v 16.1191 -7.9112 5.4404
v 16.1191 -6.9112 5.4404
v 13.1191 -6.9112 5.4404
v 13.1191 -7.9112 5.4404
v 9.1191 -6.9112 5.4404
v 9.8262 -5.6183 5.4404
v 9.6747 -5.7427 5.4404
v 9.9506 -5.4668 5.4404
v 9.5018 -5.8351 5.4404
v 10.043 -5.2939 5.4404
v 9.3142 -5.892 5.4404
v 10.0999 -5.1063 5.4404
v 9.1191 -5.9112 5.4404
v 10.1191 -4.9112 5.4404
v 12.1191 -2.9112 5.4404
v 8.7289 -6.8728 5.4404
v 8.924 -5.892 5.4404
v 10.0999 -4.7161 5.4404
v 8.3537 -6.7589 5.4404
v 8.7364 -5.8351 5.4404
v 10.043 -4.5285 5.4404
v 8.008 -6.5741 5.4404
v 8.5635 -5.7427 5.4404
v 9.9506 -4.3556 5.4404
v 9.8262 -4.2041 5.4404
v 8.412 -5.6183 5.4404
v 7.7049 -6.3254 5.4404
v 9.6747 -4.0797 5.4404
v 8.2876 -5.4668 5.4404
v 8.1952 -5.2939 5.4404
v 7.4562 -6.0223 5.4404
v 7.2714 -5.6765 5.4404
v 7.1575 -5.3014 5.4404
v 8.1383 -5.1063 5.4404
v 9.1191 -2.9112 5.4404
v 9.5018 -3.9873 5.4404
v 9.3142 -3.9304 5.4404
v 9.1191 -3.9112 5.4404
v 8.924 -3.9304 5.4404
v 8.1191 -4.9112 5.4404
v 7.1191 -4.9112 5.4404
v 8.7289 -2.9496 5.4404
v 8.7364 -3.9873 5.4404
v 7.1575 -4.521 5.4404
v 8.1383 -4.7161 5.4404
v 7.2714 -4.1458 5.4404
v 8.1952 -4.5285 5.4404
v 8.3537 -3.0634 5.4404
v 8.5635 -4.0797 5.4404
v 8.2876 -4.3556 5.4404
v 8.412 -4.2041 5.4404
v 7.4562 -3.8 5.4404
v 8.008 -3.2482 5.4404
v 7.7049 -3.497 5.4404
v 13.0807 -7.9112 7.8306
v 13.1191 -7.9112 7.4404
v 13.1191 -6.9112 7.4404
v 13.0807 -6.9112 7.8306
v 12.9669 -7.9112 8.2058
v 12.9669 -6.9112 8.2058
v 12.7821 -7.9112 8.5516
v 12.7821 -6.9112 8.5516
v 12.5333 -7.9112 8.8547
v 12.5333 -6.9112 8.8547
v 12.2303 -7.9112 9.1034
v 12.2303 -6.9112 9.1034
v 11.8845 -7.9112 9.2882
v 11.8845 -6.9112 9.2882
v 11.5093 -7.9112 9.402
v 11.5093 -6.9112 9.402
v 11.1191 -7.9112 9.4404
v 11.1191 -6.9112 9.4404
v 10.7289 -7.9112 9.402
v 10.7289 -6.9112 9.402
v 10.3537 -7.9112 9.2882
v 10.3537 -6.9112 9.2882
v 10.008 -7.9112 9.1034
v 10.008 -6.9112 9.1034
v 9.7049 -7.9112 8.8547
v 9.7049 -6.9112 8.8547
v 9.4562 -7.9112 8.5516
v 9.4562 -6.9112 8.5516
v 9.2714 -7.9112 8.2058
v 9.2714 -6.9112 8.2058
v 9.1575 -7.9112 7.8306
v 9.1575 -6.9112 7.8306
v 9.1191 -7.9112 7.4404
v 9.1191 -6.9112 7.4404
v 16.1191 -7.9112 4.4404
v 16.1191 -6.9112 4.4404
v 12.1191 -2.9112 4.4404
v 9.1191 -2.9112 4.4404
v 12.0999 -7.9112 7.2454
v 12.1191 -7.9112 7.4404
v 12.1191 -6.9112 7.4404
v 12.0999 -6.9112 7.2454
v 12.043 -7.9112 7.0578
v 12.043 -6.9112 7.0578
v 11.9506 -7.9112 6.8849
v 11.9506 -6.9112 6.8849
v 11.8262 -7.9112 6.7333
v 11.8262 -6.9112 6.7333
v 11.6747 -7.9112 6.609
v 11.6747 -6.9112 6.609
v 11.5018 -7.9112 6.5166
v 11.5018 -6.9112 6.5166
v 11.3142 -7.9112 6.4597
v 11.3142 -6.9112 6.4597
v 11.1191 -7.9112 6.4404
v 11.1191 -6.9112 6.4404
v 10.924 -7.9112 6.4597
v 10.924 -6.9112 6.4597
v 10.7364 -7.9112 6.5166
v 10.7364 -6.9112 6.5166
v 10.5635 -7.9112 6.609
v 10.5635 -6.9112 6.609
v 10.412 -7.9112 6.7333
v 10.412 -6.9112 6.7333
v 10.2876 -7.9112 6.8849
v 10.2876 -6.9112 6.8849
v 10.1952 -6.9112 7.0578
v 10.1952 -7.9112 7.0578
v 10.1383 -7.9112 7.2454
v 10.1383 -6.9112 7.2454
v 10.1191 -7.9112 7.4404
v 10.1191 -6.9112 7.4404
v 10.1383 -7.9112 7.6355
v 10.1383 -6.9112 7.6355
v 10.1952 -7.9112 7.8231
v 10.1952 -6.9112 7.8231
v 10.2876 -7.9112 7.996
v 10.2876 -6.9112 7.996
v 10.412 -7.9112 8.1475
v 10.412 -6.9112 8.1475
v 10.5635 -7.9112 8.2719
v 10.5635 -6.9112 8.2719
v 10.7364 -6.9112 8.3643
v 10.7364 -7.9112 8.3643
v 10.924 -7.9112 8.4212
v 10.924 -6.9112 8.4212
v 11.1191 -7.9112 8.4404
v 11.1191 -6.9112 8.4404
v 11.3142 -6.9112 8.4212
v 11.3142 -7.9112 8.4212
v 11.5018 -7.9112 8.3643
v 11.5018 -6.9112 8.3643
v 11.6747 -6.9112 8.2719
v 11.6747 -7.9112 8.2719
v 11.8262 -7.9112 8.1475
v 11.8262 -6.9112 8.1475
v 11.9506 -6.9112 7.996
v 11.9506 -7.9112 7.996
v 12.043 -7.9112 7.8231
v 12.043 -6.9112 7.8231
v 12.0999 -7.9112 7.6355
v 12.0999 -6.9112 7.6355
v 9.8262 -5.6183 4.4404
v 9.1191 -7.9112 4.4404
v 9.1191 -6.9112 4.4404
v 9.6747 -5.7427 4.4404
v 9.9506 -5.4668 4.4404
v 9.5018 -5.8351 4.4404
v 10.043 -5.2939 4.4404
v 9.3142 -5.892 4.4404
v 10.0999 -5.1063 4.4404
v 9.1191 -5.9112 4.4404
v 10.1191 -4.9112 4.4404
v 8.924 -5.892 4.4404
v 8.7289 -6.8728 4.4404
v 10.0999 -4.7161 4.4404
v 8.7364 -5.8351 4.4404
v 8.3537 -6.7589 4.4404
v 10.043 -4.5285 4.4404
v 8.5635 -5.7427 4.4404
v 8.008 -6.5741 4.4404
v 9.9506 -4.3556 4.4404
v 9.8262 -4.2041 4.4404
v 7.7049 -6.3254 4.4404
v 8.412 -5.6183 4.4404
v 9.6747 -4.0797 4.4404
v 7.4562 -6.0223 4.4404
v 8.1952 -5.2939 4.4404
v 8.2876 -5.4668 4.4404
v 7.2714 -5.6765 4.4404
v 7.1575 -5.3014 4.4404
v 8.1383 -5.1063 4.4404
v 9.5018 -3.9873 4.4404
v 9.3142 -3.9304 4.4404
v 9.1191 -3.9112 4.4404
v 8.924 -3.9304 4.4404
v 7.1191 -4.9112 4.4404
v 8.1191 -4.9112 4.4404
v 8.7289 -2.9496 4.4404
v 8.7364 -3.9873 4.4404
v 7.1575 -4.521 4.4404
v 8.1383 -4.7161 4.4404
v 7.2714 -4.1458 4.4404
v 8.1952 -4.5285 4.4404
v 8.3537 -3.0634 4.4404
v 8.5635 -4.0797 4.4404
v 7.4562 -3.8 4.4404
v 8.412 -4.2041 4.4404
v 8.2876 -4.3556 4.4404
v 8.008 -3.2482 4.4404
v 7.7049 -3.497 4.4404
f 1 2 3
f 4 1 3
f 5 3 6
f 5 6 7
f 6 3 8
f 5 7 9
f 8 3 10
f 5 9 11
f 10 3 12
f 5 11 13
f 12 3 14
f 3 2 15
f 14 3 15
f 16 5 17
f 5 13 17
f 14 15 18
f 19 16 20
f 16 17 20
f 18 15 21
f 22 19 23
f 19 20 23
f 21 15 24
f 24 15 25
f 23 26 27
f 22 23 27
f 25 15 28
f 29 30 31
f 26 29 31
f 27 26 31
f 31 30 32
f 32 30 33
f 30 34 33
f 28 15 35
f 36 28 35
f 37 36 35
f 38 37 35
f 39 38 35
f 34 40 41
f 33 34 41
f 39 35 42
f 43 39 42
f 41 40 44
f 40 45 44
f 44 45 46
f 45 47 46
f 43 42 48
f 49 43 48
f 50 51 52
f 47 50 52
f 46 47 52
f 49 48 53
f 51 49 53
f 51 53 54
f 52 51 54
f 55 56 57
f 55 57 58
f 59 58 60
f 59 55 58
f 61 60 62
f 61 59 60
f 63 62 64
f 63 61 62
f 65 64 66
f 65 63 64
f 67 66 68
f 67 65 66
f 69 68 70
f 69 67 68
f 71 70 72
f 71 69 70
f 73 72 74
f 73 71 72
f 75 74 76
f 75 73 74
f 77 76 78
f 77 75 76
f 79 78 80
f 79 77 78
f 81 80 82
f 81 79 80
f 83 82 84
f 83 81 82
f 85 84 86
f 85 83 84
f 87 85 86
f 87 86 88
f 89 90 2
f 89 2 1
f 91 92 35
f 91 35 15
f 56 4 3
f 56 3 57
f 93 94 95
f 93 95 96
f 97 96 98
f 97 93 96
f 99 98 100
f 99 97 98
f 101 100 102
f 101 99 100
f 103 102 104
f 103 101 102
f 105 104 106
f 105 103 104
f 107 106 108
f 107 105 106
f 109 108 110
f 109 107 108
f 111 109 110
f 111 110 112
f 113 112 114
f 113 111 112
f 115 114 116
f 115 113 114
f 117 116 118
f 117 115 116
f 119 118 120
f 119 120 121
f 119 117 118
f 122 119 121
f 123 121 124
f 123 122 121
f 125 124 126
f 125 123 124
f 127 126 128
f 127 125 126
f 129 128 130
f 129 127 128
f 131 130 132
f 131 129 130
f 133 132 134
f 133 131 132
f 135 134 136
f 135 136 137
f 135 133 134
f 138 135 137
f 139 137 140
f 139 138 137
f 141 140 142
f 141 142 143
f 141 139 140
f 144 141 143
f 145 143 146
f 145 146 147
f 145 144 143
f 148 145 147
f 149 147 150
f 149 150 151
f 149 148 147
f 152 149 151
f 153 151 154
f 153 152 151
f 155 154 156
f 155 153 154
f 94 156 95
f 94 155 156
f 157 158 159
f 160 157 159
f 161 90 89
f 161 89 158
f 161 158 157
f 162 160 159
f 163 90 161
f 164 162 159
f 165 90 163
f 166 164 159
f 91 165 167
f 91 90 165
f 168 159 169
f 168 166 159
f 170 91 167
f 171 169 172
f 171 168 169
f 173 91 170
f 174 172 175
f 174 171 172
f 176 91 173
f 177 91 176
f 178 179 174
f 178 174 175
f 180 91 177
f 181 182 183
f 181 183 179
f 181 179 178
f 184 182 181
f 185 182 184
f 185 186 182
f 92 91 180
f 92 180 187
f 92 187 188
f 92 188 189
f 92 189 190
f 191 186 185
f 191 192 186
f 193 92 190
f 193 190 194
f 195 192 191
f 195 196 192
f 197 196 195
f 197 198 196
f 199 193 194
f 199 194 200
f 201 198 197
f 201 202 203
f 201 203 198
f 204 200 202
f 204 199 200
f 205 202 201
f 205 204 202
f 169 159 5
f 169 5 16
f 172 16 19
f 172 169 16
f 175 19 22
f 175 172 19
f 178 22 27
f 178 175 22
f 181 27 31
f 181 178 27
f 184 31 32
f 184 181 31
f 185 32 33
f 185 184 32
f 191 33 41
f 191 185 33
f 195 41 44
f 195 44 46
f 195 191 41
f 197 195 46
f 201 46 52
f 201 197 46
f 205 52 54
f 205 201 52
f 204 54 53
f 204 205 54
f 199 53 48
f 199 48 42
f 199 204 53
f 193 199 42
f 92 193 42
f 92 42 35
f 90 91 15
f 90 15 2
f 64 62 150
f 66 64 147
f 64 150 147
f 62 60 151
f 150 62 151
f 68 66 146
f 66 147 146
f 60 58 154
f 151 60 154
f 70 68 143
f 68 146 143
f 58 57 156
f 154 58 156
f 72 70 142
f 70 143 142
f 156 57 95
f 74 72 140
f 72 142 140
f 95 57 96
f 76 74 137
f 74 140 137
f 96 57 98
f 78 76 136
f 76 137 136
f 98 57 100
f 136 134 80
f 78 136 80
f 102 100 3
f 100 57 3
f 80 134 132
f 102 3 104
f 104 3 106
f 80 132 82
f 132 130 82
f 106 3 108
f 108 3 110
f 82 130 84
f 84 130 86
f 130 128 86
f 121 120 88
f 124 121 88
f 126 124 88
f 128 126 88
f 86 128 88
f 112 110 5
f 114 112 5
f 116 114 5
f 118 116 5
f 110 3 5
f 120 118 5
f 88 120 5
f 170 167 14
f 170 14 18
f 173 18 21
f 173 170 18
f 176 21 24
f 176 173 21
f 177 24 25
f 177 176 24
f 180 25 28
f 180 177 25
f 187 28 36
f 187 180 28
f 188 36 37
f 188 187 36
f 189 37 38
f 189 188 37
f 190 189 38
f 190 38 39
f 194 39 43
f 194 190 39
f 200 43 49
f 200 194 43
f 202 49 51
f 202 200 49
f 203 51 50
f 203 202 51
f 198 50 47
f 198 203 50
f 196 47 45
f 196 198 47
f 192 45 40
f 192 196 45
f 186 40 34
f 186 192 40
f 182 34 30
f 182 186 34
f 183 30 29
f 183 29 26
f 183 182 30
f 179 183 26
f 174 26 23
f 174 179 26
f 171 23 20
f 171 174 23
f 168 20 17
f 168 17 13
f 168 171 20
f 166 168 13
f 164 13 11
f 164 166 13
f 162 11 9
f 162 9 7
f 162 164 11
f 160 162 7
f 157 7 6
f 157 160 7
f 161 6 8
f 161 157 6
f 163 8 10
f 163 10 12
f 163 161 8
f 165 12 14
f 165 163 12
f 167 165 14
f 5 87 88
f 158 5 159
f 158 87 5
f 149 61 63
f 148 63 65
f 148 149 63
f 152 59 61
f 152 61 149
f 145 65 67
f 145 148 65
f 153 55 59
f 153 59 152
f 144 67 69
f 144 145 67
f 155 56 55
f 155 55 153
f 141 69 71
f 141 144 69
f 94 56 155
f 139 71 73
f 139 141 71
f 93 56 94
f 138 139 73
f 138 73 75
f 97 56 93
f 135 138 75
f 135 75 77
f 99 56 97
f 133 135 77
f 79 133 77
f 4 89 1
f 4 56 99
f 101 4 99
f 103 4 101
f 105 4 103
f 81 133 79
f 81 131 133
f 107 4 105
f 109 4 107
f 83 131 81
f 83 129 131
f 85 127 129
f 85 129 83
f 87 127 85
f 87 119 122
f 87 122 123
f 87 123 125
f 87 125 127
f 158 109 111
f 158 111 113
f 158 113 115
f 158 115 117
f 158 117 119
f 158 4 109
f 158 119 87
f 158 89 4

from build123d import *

# Parameters (mm, degrees)
SKETCH_1_R      = 5
EXTRUDE_1_DEPTH = 5
EXTRUDE_START   = -15
SKETCH_2_R      = 5
EXTRUDE_2_DEPTH = 5
SCALE_1_SCALE   = 0.2


with BuildPart() as part:
    # 草圖1 → 填料-伸長1 (new body)
    with BuildSketch(Plane.XY):
        with BuildLine():
            Line((0, 10), (15, 10))
            Line((15, 10), (35, -10))
            Line((35, -10), (35, -15))
            Line((35, -15), (0, -15))
            Line((0, -15), (0, -10))
            ThreePointArc((0, -10), (-10, 0), (0, 10))
        make_face()
        Circle(SKETCH_1_R, mode=Mode.SUBTRACT)
    extrude(amount=EXTRUDE_1_DEPTH)

    # 草圖2 → 填料-伸長2 (add)
    with BuildSketch(Plane(origin=(0, 0, 0), x_dir=(1, 0, 0), z_dir=(0, 1, 0)).offset(EXTRUDE_START)):
        with BuildLine():
            Line((0, -15), (0, -5))
            Line((0, -5), (20, -5))
            Line((20, -5), (20, -15))
            ThreePointArc((20, -15), (10, -25), (0, -15))
        make_face()
        with Locations((10, -15)):
            Circle(SKETCH_2_R, mode=Mode.SUBTRACT)
    extrude(amount=EXTRUDE_2_DEPTH)


with BuildPart() as part_1:
    # 縮放比例1: scaled about (11.398892544, -6.138978205, 5.550553728)
    add(part.part.scale(SCALE_1_SCALE).moved(Location((9.119114035, -4.911182564, 4.440442982))))


solid = part_1.part
